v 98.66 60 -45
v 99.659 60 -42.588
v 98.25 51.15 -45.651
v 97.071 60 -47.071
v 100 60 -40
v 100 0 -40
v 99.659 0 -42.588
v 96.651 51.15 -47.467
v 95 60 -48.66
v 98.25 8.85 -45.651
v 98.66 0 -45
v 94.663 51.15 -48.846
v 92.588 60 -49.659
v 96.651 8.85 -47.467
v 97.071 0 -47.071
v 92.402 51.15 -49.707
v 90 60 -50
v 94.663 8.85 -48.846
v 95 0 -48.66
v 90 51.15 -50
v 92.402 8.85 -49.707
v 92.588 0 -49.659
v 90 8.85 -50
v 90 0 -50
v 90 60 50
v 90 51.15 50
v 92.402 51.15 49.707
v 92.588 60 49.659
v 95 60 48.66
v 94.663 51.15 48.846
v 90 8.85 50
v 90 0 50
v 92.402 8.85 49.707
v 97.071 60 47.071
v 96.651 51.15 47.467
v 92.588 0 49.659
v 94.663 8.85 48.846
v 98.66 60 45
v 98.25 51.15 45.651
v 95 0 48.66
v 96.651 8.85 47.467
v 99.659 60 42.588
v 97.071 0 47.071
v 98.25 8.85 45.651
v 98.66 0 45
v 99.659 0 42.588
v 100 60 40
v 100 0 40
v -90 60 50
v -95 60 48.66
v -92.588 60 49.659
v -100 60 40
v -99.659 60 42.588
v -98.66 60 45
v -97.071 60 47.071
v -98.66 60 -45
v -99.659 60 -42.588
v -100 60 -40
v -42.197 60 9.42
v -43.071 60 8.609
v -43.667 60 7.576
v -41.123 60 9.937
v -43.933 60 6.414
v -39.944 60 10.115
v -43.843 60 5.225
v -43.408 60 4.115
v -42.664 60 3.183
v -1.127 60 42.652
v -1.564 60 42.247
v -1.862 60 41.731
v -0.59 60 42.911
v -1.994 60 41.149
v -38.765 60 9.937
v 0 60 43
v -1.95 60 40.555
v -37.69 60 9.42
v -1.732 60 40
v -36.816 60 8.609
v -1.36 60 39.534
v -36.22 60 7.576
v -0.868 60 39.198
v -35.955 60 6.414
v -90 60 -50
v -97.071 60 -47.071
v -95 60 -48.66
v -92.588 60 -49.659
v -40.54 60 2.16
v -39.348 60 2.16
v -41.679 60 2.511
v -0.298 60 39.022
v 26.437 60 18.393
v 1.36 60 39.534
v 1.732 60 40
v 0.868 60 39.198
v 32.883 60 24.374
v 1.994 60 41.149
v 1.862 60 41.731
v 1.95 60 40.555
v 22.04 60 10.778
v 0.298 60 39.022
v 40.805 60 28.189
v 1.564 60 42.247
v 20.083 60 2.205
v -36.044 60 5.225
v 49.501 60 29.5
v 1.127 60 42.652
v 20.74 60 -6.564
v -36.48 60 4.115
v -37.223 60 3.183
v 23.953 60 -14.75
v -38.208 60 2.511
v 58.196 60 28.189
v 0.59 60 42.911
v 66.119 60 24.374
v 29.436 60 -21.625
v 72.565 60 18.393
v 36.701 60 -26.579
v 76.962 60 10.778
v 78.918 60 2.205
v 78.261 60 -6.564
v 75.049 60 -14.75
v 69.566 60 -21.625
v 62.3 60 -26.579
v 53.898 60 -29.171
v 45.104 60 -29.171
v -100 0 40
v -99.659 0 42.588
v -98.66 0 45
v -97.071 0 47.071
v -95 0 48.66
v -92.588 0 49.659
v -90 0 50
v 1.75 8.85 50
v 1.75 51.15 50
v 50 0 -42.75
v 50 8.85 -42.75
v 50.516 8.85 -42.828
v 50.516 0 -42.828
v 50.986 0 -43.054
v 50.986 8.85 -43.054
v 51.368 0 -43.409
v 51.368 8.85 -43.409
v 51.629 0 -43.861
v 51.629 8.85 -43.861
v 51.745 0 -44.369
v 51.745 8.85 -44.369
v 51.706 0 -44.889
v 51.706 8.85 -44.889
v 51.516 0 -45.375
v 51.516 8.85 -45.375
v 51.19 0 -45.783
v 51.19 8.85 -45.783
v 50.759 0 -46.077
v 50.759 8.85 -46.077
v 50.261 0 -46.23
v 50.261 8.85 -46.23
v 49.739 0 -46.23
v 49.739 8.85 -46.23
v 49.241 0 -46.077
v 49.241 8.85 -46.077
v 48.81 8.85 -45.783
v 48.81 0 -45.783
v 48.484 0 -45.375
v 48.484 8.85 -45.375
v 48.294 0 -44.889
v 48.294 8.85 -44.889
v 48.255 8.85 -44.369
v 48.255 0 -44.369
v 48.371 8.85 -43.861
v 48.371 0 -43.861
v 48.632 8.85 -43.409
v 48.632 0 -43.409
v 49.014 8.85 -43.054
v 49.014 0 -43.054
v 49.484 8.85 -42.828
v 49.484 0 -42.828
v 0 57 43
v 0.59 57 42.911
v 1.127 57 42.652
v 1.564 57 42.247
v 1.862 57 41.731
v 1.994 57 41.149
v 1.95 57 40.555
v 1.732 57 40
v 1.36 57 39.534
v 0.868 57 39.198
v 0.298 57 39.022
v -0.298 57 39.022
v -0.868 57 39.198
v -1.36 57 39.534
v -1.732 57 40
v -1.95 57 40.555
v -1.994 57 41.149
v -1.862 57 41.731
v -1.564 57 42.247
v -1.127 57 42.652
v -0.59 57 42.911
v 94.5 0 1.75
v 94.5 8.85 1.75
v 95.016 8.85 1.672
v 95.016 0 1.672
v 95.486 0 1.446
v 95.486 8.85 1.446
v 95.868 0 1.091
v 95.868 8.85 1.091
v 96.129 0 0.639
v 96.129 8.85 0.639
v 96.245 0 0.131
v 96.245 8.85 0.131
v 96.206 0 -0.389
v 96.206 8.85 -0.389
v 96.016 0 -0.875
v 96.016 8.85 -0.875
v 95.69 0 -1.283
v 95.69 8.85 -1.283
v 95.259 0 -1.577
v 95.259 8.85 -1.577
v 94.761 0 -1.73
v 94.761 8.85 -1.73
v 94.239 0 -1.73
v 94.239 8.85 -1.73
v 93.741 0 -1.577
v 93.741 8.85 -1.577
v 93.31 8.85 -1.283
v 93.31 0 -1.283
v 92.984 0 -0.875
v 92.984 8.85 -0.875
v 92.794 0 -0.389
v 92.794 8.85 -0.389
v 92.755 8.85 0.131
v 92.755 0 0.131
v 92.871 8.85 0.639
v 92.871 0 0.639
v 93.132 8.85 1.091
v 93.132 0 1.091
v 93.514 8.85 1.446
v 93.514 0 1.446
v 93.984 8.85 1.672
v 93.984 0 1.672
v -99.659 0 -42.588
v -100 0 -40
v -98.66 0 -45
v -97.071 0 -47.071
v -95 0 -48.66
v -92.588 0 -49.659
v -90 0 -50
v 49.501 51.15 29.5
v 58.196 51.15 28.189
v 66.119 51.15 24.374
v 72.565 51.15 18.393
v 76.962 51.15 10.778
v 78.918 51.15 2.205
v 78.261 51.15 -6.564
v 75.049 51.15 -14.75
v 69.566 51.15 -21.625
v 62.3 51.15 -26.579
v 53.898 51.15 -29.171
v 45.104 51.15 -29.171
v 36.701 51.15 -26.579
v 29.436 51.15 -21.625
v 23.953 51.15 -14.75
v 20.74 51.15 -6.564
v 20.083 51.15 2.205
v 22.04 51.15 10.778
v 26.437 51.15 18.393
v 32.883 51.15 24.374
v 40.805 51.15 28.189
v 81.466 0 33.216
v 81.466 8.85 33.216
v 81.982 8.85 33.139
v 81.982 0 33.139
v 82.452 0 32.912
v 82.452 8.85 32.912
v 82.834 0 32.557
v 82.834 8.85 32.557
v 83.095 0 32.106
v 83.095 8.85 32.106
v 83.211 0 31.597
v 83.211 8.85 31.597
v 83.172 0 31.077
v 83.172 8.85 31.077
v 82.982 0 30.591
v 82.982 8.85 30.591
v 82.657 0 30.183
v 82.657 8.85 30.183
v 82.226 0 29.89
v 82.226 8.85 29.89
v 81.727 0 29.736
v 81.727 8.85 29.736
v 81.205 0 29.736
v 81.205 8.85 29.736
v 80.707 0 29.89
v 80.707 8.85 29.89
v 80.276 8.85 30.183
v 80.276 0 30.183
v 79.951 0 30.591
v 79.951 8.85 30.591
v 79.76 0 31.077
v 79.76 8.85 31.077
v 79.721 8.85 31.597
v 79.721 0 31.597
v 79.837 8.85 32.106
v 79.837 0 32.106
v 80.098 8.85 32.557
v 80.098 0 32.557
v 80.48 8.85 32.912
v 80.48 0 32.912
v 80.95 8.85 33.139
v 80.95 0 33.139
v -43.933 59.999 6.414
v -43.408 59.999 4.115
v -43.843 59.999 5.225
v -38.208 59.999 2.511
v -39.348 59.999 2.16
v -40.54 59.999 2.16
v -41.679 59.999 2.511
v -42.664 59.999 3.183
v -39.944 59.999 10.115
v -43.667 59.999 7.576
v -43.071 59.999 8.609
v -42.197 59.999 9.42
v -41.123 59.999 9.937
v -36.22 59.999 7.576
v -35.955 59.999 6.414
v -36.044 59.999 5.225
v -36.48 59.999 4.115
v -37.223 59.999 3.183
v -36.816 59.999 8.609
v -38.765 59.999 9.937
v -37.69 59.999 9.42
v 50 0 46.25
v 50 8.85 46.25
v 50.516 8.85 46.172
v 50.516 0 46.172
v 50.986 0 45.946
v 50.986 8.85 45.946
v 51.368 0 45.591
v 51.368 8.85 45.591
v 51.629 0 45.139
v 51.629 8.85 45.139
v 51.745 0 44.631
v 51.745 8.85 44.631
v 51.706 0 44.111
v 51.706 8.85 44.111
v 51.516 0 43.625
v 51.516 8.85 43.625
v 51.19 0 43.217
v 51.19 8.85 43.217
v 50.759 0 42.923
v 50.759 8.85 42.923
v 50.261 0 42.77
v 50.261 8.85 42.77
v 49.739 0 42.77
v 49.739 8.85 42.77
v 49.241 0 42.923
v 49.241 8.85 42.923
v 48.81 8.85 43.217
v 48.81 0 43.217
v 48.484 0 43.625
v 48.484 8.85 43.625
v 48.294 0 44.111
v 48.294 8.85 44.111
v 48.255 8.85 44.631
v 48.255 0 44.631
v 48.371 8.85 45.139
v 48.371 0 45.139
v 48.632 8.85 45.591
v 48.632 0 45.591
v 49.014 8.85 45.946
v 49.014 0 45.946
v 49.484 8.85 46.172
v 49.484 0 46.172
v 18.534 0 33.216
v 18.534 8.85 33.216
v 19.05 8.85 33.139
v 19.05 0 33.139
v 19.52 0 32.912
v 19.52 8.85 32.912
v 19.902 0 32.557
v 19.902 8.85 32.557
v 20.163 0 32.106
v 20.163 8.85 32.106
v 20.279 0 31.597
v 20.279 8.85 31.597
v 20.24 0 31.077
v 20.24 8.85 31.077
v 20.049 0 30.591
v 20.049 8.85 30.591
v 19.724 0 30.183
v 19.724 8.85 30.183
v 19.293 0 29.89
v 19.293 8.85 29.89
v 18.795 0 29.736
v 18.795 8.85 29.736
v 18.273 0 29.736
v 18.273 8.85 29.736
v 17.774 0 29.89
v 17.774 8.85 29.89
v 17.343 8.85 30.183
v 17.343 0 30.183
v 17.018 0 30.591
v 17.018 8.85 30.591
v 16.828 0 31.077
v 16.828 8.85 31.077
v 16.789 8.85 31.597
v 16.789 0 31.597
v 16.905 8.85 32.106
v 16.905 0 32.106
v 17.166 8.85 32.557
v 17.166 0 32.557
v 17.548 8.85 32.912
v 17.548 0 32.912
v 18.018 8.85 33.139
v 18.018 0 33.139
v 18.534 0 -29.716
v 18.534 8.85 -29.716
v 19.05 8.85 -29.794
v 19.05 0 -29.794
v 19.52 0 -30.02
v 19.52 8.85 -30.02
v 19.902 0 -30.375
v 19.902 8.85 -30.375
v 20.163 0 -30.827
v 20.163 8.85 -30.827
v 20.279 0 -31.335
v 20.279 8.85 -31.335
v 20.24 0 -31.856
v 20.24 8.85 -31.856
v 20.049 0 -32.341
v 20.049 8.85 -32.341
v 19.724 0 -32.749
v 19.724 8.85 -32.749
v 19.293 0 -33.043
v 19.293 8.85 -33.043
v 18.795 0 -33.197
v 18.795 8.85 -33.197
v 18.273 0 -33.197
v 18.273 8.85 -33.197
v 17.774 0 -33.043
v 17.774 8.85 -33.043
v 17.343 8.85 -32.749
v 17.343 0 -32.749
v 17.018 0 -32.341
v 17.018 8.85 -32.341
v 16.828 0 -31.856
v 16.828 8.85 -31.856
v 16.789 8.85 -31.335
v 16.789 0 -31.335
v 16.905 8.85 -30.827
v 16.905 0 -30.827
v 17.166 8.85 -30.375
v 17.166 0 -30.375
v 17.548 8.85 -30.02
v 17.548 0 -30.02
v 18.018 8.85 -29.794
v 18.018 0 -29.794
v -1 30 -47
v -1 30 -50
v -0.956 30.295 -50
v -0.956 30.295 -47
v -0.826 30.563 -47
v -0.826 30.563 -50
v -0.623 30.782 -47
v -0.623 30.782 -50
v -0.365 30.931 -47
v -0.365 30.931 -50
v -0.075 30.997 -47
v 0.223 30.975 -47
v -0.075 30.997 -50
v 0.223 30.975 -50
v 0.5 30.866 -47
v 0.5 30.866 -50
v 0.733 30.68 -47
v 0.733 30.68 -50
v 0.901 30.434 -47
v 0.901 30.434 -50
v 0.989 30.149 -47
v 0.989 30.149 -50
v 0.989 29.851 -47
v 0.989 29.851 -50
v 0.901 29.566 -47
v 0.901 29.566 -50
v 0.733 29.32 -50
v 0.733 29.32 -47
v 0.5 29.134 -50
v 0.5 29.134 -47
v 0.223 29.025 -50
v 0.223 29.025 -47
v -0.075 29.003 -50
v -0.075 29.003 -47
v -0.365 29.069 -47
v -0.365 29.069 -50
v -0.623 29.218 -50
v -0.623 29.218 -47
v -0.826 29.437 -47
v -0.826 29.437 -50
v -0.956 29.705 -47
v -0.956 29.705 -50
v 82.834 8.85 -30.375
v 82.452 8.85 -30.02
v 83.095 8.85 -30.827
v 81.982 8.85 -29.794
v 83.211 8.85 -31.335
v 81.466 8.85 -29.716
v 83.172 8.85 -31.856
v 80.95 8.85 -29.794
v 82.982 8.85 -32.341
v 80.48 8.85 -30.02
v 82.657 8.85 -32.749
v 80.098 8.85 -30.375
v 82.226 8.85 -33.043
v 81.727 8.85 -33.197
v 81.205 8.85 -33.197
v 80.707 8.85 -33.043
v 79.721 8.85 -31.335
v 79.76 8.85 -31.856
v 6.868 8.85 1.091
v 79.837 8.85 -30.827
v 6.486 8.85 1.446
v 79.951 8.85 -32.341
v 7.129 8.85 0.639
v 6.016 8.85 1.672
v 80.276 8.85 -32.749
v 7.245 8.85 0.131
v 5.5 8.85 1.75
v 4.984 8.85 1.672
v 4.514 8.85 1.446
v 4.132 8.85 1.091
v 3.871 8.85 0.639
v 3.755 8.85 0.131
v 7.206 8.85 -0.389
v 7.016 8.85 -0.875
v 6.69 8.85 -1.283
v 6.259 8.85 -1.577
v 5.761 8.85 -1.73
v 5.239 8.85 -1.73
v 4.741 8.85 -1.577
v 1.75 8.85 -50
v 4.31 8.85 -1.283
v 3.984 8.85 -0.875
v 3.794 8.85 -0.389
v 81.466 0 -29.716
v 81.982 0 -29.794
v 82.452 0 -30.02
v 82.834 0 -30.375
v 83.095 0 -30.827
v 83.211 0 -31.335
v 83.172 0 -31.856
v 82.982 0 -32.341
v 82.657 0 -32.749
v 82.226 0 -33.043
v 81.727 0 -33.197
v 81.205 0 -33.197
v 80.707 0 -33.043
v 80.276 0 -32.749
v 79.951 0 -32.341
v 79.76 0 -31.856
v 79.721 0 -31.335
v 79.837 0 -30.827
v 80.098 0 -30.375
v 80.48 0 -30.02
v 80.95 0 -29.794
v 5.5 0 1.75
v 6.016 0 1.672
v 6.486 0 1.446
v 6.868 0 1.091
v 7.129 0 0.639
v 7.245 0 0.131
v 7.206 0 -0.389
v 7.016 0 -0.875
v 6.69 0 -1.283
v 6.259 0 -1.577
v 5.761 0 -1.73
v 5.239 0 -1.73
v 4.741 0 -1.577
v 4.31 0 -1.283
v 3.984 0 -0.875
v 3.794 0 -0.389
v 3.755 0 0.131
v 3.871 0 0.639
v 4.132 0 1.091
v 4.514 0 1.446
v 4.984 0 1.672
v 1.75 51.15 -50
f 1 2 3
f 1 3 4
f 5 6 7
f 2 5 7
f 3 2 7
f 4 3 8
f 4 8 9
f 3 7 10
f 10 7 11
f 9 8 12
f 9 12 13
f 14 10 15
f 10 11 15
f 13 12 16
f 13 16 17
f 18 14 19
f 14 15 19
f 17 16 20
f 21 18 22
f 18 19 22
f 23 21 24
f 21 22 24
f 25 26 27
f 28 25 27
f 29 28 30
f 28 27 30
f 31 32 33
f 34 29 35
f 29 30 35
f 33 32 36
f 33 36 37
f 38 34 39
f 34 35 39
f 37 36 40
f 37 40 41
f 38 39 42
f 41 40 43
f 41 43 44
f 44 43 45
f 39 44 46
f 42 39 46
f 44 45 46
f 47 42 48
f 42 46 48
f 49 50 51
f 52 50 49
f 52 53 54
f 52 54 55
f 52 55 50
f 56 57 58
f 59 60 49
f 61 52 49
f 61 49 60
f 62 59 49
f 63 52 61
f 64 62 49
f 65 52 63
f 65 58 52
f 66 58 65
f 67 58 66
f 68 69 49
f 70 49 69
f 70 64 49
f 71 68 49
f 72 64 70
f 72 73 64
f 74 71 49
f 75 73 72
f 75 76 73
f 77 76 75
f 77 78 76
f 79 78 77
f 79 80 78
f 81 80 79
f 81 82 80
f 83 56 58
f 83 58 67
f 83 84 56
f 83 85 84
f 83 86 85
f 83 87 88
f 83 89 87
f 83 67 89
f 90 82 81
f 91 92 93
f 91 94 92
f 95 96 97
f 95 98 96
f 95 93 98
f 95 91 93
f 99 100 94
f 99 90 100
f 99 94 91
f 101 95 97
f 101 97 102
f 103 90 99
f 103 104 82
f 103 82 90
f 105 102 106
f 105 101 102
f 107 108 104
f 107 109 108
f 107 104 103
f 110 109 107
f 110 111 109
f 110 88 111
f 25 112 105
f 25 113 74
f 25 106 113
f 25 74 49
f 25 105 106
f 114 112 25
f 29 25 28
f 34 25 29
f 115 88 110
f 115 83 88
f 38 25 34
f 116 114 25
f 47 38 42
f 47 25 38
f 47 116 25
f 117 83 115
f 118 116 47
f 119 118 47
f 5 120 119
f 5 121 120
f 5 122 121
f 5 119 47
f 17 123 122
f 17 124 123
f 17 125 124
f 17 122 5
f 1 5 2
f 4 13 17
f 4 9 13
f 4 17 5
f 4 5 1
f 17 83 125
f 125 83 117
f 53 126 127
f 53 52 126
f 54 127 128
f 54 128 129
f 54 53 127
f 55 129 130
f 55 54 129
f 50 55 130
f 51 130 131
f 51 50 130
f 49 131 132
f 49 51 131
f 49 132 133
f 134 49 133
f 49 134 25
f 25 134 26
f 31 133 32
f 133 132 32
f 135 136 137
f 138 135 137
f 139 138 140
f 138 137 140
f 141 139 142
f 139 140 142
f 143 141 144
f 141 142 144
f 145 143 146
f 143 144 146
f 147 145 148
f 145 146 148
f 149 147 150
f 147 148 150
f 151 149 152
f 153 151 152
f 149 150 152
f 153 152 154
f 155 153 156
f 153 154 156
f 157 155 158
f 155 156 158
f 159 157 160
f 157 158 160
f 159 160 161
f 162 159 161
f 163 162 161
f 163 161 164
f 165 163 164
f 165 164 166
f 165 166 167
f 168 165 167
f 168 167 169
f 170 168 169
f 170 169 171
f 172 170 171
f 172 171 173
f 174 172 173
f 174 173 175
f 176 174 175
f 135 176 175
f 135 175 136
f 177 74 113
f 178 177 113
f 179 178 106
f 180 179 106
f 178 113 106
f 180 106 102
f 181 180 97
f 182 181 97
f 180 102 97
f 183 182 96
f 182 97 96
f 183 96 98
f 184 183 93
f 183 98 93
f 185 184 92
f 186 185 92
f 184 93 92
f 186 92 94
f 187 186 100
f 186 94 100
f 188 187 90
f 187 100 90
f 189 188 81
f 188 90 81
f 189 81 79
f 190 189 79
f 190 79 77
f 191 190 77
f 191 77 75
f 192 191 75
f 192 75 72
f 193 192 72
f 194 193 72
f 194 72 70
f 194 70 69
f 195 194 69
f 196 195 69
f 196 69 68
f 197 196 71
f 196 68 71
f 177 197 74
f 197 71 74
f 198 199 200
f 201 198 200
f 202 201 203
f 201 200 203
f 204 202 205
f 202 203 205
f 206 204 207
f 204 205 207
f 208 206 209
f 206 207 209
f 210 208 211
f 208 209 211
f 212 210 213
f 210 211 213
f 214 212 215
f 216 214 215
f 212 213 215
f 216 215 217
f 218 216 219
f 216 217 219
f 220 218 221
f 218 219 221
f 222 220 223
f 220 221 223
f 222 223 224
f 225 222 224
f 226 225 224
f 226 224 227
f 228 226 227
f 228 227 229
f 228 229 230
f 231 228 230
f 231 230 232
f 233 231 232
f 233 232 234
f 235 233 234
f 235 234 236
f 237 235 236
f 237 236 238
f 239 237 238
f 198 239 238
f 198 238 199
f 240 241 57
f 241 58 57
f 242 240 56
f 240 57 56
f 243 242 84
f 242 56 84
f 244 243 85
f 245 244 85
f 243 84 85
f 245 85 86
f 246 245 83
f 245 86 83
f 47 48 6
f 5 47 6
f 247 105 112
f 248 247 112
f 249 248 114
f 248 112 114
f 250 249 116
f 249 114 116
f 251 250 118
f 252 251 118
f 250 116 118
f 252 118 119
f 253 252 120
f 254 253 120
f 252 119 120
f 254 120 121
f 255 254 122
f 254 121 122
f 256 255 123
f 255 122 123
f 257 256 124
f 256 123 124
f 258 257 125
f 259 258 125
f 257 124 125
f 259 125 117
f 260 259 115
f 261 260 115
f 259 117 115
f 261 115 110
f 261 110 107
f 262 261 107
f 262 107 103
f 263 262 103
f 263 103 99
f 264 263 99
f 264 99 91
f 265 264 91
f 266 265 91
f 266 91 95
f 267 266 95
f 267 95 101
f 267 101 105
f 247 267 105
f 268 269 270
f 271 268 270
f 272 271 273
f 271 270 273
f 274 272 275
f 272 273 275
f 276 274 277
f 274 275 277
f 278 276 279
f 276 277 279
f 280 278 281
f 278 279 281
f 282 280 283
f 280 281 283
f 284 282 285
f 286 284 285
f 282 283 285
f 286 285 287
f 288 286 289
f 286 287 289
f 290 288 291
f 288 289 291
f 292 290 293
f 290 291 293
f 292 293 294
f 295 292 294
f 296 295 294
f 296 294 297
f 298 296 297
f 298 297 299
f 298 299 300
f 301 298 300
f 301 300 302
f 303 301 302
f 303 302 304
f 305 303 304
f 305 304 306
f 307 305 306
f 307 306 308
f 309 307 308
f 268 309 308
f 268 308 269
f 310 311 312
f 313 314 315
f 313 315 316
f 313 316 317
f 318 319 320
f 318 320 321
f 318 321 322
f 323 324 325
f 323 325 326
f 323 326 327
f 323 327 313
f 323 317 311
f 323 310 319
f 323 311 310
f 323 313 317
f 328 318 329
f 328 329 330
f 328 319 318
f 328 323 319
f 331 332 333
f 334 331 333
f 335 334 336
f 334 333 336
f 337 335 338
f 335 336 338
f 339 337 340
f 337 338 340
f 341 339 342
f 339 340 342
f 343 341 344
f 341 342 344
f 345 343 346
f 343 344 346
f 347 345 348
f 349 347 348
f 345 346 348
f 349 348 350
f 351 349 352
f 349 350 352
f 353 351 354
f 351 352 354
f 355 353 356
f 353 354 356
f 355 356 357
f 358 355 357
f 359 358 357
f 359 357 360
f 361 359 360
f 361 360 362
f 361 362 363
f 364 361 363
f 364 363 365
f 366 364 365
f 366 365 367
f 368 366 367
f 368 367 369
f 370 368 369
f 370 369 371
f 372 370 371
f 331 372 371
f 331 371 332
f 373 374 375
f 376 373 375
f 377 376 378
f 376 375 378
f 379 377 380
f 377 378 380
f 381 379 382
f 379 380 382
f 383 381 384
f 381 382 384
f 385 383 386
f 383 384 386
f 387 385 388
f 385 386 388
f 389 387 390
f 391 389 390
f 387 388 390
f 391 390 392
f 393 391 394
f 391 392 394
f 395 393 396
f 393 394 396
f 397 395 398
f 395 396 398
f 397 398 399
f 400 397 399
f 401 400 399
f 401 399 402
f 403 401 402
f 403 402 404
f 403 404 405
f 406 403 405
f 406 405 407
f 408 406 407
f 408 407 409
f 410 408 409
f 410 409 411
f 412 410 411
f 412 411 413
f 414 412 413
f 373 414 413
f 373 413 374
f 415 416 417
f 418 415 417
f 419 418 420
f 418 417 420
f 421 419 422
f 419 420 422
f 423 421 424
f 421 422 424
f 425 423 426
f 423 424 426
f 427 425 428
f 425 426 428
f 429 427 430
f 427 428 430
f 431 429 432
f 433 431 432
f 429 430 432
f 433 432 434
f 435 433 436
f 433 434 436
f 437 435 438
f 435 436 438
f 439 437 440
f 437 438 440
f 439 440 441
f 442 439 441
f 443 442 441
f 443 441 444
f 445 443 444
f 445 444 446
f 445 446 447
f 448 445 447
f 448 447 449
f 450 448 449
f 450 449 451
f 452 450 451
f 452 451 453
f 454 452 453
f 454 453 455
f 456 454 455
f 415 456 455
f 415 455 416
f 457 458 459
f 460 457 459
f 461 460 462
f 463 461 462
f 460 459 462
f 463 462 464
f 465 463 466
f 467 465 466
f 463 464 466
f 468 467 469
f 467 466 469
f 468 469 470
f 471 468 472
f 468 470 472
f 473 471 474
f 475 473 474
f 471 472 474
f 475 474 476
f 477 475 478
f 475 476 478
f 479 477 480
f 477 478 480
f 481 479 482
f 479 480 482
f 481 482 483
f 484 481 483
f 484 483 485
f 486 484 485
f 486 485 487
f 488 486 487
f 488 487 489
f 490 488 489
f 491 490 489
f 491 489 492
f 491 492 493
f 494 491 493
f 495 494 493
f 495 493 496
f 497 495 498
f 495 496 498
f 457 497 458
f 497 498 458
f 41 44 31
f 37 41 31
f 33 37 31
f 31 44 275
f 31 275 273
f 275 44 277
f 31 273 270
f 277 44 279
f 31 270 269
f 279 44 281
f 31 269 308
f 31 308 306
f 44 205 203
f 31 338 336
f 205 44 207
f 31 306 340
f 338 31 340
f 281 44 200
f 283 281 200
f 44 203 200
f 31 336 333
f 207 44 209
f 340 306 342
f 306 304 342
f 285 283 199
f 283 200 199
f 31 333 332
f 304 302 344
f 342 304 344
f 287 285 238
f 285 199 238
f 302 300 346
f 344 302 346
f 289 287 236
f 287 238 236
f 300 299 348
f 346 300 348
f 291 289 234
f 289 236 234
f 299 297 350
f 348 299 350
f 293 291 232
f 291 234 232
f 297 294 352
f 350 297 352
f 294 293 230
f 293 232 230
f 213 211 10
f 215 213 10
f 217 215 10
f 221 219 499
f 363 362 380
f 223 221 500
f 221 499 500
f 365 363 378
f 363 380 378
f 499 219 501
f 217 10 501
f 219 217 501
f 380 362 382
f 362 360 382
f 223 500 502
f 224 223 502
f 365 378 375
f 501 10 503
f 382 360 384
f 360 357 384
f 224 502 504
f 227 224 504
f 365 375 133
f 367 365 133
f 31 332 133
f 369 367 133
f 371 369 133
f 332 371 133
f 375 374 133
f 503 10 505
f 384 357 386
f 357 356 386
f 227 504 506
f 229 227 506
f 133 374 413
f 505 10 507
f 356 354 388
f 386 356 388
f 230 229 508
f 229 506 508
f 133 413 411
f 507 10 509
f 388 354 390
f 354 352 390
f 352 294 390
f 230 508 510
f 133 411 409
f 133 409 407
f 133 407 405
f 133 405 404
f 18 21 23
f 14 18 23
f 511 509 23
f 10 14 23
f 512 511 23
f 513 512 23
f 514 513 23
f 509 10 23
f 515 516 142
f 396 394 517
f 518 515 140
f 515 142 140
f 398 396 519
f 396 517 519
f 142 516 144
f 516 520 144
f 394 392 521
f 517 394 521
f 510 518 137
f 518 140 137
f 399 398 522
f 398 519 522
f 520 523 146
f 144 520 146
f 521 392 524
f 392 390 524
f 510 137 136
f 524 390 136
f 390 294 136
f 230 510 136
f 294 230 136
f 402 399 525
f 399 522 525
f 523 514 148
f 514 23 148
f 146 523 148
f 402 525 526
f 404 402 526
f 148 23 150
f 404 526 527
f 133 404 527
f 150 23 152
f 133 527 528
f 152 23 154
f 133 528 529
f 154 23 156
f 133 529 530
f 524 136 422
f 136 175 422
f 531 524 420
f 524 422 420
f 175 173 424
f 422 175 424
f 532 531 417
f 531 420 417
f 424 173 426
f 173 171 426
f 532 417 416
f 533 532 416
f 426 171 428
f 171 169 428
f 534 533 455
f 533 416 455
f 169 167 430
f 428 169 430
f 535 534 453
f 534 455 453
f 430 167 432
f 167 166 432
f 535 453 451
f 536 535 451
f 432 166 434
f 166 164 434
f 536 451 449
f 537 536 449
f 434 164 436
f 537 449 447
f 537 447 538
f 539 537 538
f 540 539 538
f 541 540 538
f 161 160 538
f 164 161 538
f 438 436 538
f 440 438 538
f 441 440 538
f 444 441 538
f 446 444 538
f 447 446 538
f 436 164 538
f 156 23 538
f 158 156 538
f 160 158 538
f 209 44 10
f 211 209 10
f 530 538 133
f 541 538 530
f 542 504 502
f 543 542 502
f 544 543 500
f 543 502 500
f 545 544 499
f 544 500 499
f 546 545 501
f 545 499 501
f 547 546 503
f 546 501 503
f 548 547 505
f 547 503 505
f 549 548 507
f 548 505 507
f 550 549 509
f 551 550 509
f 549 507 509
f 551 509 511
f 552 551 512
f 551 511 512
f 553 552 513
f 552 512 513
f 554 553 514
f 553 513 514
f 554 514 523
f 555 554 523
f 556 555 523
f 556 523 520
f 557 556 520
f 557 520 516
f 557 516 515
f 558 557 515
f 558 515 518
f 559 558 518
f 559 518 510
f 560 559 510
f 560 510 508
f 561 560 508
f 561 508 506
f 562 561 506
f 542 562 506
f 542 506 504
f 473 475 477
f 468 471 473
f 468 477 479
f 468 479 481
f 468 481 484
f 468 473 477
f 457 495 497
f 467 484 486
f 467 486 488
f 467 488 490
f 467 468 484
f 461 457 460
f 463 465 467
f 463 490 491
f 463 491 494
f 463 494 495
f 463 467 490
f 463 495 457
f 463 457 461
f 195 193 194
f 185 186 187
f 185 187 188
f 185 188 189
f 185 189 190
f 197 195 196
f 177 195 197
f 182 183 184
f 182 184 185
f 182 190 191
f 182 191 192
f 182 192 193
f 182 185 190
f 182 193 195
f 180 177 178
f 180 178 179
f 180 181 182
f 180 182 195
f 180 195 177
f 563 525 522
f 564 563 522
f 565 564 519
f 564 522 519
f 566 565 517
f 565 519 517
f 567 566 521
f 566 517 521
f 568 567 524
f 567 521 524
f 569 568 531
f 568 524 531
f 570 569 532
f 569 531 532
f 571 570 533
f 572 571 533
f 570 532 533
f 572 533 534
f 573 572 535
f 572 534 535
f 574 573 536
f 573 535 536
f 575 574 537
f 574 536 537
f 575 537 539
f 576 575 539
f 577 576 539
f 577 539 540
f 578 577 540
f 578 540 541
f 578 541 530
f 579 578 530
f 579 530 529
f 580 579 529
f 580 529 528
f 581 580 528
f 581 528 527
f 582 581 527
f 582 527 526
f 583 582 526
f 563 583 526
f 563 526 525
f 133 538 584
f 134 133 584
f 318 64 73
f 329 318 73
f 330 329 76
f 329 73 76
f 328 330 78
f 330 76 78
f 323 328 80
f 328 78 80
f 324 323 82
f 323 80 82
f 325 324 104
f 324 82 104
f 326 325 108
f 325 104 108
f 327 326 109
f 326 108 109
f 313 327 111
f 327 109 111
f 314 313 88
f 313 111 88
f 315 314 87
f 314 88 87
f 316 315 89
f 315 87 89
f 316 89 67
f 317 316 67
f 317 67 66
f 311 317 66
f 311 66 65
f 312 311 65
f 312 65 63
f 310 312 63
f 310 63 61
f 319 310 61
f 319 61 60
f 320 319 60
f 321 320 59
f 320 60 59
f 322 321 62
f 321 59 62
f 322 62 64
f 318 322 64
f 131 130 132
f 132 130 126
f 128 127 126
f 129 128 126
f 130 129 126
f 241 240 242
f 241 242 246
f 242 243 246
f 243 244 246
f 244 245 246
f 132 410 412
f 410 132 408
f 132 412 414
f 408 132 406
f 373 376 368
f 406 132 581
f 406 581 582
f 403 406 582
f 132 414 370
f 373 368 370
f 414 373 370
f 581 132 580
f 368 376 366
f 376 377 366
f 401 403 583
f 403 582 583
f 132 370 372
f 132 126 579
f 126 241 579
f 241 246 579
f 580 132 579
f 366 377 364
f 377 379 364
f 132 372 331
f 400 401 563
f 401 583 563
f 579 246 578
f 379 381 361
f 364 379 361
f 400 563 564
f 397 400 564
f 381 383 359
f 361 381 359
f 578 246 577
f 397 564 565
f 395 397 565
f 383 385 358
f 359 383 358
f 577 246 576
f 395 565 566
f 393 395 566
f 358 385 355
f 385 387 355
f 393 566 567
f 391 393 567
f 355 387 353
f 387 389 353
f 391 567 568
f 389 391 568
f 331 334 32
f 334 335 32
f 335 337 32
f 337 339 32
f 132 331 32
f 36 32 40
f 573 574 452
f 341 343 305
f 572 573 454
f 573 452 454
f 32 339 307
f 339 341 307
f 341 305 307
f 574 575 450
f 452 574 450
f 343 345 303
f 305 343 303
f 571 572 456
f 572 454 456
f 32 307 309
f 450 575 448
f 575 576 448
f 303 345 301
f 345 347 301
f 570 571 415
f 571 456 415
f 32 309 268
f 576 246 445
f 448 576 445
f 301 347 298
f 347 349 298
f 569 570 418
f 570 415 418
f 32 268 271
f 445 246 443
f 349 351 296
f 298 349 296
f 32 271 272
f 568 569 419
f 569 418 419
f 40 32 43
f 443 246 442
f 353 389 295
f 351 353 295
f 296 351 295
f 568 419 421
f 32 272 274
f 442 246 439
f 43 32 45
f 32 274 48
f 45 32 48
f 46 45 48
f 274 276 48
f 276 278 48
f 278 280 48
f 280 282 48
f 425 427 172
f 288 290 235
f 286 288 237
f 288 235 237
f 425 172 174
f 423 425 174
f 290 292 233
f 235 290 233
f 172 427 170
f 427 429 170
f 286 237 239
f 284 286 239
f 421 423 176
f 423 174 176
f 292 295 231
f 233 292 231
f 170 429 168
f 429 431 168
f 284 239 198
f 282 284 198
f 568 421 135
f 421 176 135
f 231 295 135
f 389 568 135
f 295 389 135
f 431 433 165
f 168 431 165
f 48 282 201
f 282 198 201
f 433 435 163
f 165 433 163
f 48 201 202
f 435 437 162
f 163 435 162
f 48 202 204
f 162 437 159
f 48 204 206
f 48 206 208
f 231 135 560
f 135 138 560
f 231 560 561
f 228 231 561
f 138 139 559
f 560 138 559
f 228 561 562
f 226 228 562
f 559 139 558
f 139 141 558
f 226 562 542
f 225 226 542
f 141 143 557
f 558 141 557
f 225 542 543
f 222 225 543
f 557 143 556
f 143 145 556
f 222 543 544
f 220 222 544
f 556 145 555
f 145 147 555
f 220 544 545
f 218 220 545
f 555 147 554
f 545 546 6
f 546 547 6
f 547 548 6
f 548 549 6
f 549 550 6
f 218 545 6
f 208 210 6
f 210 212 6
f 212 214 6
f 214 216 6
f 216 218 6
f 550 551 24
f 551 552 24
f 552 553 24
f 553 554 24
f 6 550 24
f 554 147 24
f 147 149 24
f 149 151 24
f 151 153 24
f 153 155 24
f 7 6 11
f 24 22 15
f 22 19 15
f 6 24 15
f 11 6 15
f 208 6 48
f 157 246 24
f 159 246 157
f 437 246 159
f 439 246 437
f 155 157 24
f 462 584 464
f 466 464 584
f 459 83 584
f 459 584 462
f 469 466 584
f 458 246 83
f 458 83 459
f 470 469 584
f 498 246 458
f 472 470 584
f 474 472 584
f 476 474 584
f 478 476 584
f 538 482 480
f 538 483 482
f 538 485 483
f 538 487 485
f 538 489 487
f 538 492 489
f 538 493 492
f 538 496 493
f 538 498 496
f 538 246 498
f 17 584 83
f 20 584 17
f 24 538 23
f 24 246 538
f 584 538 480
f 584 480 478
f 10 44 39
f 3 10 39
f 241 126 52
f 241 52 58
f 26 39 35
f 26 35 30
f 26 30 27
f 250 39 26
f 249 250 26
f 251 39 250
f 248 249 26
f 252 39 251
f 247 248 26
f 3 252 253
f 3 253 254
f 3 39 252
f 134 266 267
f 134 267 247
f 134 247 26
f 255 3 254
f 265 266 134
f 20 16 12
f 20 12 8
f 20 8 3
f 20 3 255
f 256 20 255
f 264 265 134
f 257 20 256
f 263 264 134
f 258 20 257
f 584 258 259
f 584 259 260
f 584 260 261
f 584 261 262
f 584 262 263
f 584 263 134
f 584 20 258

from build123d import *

# Parameters (mm, degrees)
SKETCH_1_W           = 200
SKETCH_1_H           = 100
EXTRUDE_2_DEPTH      = 60
SKETCH_4_W           = 96.5
SKETCH_4_H           = 42.3
CUT_EXTRUDE_7_DEPTH  = 180
SKETCH_10_R          = 2
CUT_EXTRUDE_12_DEPTH = 3
SKETCH_12_R          = 1
CUT_EXTRUDE_13_DEPTH = 3
SKETCH_16_R          = 29.5
CUT_EXTRUDE_14_DEPTH = 16
SKETCH_17_R          = 1.75
CUT_EXTRUDE_15_DEPTH = 10
SKETCH_22_R          = 4.000000002
CUT_EXTRUDE_16_DEPTH = 0.001
FILLET_1_R           = 10
FILLET_2_R           = 10
FILLET_3_R           = 10
FILLET_4_R           = 10


with BuildPart() as part:
    # 草图1 → 凸台-拉伸2 (new body)
    with BuildSketch(Plane(origin=(0, 0, 0), x_dir=(1, 0, 0), z_dir=(0, 1, 0))):
        Rectangle(SKETCH_1_W, SKETCH_1_H)
    extrude(amount=EXTRUDE_2_DEPTH)

    # 草图4 → 切除-拉伸7 (cut)
    with BuildSketch(Plane(origin=(0, 0, -50), x_dir=(-1, 0, 0), z_dir=(0, 0, -1))):
        with Locations((-50, 30)):
            Rectangle(SKETCH_4_W, SKETCH_4_H)
    extrude(amount=-CUT_EXTRUDE_7_DEPTH, mode=Mode.SUBTRACT)

    # 草图10 → 切除-拉伸12 (cut)
    with BuildSketch(Plane(origin=(0, 60, 0), x_dir=(1, 0, 0), z_dir=(0, 1, 0))):
        with Locations(Location((0, -41, 0), (0, 0, 270))):
            Circle(SKETCH_10_R)
    extrude(amount=-CUT_EXTRUDE_12_DEPTH, mode=Mode.SUBTRACT)

    # 草图12 → 切除-拉伸13 (cut)
    with BuildSketch(Plane(origin=(0, 0, -50), x_dir=(-1, 0, 0), z_dir=(0, 0, -1))):
        with Locations((0, 30)):
            Circle(SKETCH_12_R)
    extrude(amount=-CUT_EXTRUDE_13_DEPTH, mode=Mode.SUBTRACT)

    # 草图16 → 切除-拉伸14 (cut)
    with BuildSketch(Plane(origin=(0, 60, 0), x_dir=(1, 0, 0), z_dir=(0, 1, 0))):
        with Locations(Location((49.50076584, 0, 0), (0, 0, 270))):
            Circle(SKETCH_16_R)
    extrude(amount=-CUT_EXTRUDE_14_DEPTH, mode=Mode.SUBTRACT)

    # 草图17 → 切除-拉伸15 (cut)
    with BuildSketch(Plane(origin=(0, 8.85, 0), x_dir=(1, 0, 0), z_dir=(0, 1, 0))):
        with Locations(Location((50, -44.5, 0), (0, 0, 270))):
            Circle(SKETCH_17_R)
        with Locations(Location((18.533748237, -31.466251763, 0), (0, 0, 270))):
            Circle(SKETCH_17_R)
        with Locations(Location((5.5, 0, 0), (0, 0, 270))):
            Circle(SKETCH_17_R)
        with Locations(Location((18.533748237, 31.466251763, 0), (0, 0, 270))):
            Circle(SKETCH_17_R)
        with Locations(Location((50, 44.5, 0), (0, 0, 270))):
            Circle(SKETCH_17_R)
        with Locations(Location((81.466251763, 31.466251763, 0), (0, 0, 270))):
            Circle(SKETCH_17_R)
        with Locations(Location((94.5, 0, 0), (0, 0, 270))):
            Circle(SKETCH_17_R)
        with Locations(Location((81.466251763, -31.466251763, 0), (0, 0, 270))):
            Circle(SKETCH_17_R)
    extrude(amount=-CUT_EXTRUDE_15_DEPTH, mode=Mode.SUBTRACT)

    # 草图22 → 切除-拉伸16 (cut)
    with BuildSketch(Plane(origin=(0, 60, 0), x_dir=(1, 0, 0), z_dir=(0, 1, 0))):
        with Locations(Location((-39.943771533, -6.115069491, 0), (0, 0, 270))):
            Circle(SKETCH_22_R)
    extrude(amount=-CUT_EXTRUDE_16_DEPTH, mode=Mode.SUBTRACT)

    # 圆角1
    fillet_1_edges = [part.edges().sort_by_distance(p)[0] for p in [
        (-100, 30, -50),
    ]]
    fillet(fillet_1_edges, radius=FILLET_1_R)

    # 圆角2
    fillet_2_edges = [part.edges().sort_by_distance(p)[0] for p in [
        (-100, 30, 50),
    ]]
    fillet(fillet_2_edges, radius=FILLET_2_R)

    # 圆角3
    # the kernel refuses this fillet: 10 mm, written as the material it takes off along each edge
    with BuildSketch(Plane(origin=(100, -25, 50), x_dir=(-1, 0, 0), z_dir=(0, 1, 0))) as fillet_3_piece_1:
        with BuildLine():
            CenterArc((FILLET_3_R, -FILLET_3_R), FILLET_3_R, 90, 90)
            Line((0, -FILLET_3_R), (0, 0))
            Line((0, 0), (FILLET_3_R, 0))
        make_face()
    extrude(amount=110, mode=Mode.SUBTRACT)

    # 圆角4
    # the kernel refuses this fillet: 10 mm, written as the material it takes off along each edge
    with BuildSketch(Plane(origin=(100, -25, -50), x_dir=(0, 0, 1), z_dir=(0, 1, 0))) as fillet_4_piece_1:
        with BuildLine():
            CenterArc((FILLET_4_R, -FILLET_4_R), FILLET_4_R, 90, 90)
            Line((0, -FILLET_4_R), (0, 0))
            Line((0, 0), (FILLET_4_R, 0))
        make_face()
    extrude(amount=110, mode=Mode.SUBTRACT)


solid = part.part
